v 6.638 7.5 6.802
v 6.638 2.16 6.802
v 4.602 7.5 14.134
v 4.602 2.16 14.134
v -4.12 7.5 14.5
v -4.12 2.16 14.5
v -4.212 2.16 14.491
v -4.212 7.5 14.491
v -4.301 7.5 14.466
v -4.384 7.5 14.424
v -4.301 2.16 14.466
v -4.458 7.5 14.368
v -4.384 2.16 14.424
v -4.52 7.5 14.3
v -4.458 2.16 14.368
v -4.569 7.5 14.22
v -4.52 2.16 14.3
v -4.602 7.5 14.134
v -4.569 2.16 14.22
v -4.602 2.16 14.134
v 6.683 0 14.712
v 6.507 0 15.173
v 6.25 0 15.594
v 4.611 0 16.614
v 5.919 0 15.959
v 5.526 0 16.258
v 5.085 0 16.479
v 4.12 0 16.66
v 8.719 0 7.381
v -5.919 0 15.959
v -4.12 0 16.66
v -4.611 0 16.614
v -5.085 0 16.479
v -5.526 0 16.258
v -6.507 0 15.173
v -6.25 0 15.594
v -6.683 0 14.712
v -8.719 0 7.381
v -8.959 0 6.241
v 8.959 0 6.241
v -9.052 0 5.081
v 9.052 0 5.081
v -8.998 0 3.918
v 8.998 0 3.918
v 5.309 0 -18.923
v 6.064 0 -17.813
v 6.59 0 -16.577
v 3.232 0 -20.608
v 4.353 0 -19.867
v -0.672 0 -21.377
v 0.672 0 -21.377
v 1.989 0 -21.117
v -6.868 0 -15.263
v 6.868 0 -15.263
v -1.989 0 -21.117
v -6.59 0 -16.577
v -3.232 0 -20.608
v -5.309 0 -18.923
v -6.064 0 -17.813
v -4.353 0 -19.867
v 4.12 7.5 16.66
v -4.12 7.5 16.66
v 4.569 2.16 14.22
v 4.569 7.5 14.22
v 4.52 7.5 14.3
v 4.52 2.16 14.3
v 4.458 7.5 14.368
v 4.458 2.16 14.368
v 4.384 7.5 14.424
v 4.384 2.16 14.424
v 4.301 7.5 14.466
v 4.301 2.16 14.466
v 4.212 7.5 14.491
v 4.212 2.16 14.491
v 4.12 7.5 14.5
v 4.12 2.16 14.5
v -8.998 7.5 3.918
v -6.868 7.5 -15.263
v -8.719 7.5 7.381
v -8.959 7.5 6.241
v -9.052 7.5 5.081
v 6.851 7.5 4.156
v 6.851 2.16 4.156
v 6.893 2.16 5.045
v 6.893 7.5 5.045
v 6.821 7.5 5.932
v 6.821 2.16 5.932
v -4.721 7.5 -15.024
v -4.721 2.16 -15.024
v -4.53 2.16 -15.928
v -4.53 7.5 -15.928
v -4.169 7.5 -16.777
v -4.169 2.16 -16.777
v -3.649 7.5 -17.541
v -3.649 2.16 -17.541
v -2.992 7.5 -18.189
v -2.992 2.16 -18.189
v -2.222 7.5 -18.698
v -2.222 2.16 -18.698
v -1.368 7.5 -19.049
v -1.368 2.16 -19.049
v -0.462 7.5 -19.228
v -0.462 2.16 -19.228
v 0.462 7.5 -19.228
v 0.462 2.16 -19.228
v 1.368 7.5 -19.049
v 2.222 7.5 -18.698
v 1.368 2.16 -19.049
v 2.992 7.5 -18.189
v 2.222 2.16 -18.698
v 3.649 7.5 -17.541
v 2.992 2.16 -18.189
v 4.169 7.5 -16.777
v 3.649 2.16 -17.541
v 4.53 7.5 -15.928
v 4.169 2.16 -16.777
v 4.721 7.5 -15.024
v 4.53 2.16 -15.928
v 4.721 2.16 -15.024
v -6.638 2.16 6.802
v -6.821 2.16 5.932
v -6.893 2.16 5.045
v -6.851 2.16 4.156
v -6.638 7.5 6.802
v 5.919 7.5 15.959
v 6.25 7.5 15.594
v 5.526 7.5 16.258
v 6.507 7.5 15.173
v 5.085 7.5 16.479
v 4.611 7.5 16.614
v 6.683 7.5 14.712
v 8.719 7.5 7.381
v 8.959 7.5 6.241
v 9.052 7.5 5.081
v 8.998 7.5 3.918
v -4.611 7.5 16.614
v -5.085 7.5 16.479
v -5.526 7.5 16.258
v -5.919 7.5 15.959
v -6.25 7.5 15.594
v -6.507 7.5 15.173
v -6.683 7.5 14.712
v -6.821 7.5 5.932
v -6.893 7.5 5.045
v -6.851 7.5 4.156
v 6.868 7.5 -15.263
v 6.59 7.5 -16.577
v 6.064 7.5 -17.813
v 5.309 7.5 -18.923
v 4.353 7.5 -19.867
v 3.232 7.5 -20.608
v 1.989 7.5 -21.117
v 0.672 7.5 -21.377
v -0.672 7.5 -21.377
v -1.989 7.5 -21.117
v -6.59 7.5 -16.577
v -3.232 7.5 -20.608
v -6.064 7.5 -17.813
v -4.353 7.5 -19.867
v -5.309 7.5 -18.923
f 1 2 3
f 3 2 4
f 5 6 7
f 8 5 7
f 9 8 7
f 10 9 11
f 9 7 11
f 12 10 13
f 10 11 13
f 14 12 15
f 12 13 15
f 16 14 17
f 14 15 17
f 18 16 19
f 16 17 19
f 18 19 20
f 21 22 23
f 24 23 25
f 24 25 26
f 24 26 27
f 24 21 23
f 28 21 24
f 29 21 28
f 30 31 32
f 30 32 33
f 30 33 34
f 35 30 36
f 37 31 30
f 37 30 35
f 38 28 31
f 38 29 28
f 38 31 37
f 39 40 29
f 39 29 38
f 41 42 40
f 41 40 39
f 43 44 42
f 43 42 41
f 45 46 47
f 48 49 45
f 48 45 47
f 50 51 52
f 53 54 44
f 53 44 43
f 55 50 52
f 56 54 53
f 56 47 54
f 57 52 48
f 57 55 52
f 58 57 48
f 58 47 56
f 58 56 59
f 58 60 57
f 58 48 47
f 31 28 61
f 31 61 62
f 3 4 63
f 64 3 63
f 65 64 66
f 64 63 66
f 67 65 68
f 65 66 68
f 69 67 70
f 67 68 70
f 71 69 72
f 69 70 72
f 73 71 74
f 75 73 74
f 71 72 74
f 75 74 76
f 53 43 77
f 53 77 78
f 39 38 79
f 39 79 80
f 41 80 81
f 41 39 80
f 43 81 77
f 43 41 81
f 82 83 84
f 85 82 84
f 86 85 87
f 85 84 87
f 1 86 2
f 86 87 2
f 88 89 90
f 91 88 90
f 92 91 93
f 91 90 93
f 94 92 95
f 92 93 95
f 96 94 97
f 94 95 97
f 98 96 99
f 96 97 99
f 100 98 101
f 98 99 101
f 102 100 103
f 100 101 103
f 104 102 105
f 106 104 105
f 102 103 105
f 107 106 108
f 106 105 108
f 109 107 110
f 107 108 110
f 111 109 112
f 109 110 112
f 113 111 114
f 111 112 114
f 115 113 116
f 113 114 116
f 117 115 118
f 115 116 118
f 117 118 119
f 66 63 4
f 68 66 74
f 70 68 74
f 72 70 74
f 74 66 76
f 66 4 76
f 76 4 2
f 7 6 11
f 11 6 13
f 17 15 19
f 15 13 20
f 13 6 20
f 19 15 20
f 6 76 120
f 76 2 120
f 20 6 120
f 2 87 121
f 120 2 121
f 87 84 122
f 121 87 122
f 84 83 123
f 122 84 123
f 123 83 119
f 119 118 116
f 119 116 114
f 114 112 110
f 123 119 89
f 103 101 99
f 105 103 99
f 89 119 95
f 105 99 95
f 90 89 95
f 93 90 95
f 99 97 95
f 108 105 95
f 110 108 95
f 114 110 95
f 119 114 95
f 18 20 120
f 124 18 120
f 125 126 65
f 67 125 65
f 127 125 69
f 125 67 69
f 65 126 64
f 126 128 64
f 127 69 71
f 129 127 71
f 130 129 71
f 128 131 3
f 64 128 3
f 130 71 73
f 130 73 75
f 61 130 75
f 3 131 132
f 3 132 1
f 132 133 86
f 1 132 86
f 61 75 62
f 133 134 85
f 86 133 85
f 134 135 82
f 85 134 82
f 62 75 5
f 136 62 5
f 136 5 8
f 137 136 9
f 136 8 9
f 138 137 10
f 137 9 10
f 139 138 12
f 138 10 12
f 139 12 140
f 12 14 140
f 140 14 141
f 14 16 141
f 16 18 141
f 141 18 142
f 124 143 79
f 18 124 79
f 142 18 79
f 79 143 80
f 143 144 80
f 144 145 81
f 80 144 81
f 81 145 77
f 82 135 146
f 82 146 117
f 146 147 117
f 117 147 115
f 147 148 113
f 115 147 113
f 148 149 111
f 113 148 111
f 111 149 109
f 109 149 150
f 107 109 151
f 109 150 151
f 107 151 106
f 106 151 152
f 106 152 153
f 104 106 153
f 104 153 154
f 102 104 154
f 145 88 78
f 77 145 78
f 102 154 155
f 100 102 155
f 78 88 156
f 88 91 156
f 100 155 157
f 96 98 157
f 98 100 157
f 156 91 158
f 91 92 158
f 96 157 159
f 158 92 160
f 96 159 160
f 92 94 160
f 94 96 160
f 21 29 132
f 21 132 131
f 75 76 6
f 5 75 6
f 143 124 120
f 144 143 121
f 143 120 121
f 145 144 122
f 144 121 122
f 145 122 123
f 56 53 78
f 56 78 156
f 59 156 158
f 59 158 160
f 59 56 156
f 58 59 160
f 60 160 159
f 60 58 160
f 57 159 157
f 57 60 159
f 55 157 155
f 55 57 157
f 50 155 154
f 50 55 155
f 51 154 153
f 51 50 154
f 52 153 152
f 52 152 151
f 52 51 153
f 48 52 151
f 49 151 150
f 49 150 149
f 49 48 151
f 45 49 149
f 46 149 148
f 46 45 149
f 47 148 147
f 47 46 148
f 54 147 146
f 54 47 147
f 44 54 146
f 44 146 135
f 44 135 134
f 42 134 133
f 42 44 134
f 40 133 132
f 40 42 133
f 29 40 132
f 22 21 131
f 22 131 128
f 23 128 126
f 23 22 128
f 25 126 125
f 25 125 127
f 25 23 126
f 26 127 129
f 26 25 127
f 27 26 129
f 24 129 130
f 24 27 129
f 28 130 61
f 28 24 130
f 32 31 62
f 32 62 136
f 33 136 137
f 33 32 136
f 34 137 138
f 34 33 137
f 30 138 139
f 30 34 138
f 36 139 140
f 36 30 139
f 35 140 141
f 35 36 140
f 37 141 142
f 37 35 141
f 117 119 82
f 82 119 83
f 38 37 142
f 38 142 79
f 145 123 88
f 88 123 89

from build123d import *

# Parameters (mm, degrees)
BOSS_EXTRUDE3_DEPTH = 7.5
SHELL1_T            = -2.16


with BuildPart() as part:
    # Sketch1 → Boss-Extrude3 (new body)
    with BuildSketch(Plane(origin=(0, 0, 0), x_dir=(1, 0, 0), z_dir=(0, 1, 0))):
        with BuildLine():
            Line((6.867789963, 15.262601487), (8.997617328, -3.918067904))
            ThreePointArc((8.997617328, -3.918067904), (9.024143463, -5.662644076), (8.71939564, -7.380601705))
            Line((8.71939564, -7.380601705), (6.682914815, -14.711932678))
            ThreePointArc((6.682914815, -14.711932678), (5.729593637, -16.117704054), (4.119957175, -16.66))
            Line((4.119957175, -16.66), (-4.119957175, -16.66))
            ThreePointArc((-4.119957175, -16.66), (-5.729593637, -16.117704054), (-6.682914815, -14.711932678))
            Line((-6.682914815, -14.711932678), (-8.71939564, -7.380601705))
            ThreePointArc((-8.71939564, -7.380601705), (-9.024143463, -5.662644076), (-8.997617328, -3.918067904))
            Line((-8.997617328, -3.918067904), (-6.867789963, 15.262601487))
            ThreePointArc((-6.867789963, 15.262601487), (0, 21.41), (6.867789963, 15.262601487))
        make_face()
    extrude(amount=BOSS_EXTRUDE3_DEPTH)

    # Shell1
    shell1_openings = [part.faces().sort_by_distance(p)[0] for p in [
        (0, 7.5, -1.411749104),
    ]]
    offset(amount=SHELL1_T, openings=shell1_openings, kind=Kind.INTERSECTION)


solid = part.part
